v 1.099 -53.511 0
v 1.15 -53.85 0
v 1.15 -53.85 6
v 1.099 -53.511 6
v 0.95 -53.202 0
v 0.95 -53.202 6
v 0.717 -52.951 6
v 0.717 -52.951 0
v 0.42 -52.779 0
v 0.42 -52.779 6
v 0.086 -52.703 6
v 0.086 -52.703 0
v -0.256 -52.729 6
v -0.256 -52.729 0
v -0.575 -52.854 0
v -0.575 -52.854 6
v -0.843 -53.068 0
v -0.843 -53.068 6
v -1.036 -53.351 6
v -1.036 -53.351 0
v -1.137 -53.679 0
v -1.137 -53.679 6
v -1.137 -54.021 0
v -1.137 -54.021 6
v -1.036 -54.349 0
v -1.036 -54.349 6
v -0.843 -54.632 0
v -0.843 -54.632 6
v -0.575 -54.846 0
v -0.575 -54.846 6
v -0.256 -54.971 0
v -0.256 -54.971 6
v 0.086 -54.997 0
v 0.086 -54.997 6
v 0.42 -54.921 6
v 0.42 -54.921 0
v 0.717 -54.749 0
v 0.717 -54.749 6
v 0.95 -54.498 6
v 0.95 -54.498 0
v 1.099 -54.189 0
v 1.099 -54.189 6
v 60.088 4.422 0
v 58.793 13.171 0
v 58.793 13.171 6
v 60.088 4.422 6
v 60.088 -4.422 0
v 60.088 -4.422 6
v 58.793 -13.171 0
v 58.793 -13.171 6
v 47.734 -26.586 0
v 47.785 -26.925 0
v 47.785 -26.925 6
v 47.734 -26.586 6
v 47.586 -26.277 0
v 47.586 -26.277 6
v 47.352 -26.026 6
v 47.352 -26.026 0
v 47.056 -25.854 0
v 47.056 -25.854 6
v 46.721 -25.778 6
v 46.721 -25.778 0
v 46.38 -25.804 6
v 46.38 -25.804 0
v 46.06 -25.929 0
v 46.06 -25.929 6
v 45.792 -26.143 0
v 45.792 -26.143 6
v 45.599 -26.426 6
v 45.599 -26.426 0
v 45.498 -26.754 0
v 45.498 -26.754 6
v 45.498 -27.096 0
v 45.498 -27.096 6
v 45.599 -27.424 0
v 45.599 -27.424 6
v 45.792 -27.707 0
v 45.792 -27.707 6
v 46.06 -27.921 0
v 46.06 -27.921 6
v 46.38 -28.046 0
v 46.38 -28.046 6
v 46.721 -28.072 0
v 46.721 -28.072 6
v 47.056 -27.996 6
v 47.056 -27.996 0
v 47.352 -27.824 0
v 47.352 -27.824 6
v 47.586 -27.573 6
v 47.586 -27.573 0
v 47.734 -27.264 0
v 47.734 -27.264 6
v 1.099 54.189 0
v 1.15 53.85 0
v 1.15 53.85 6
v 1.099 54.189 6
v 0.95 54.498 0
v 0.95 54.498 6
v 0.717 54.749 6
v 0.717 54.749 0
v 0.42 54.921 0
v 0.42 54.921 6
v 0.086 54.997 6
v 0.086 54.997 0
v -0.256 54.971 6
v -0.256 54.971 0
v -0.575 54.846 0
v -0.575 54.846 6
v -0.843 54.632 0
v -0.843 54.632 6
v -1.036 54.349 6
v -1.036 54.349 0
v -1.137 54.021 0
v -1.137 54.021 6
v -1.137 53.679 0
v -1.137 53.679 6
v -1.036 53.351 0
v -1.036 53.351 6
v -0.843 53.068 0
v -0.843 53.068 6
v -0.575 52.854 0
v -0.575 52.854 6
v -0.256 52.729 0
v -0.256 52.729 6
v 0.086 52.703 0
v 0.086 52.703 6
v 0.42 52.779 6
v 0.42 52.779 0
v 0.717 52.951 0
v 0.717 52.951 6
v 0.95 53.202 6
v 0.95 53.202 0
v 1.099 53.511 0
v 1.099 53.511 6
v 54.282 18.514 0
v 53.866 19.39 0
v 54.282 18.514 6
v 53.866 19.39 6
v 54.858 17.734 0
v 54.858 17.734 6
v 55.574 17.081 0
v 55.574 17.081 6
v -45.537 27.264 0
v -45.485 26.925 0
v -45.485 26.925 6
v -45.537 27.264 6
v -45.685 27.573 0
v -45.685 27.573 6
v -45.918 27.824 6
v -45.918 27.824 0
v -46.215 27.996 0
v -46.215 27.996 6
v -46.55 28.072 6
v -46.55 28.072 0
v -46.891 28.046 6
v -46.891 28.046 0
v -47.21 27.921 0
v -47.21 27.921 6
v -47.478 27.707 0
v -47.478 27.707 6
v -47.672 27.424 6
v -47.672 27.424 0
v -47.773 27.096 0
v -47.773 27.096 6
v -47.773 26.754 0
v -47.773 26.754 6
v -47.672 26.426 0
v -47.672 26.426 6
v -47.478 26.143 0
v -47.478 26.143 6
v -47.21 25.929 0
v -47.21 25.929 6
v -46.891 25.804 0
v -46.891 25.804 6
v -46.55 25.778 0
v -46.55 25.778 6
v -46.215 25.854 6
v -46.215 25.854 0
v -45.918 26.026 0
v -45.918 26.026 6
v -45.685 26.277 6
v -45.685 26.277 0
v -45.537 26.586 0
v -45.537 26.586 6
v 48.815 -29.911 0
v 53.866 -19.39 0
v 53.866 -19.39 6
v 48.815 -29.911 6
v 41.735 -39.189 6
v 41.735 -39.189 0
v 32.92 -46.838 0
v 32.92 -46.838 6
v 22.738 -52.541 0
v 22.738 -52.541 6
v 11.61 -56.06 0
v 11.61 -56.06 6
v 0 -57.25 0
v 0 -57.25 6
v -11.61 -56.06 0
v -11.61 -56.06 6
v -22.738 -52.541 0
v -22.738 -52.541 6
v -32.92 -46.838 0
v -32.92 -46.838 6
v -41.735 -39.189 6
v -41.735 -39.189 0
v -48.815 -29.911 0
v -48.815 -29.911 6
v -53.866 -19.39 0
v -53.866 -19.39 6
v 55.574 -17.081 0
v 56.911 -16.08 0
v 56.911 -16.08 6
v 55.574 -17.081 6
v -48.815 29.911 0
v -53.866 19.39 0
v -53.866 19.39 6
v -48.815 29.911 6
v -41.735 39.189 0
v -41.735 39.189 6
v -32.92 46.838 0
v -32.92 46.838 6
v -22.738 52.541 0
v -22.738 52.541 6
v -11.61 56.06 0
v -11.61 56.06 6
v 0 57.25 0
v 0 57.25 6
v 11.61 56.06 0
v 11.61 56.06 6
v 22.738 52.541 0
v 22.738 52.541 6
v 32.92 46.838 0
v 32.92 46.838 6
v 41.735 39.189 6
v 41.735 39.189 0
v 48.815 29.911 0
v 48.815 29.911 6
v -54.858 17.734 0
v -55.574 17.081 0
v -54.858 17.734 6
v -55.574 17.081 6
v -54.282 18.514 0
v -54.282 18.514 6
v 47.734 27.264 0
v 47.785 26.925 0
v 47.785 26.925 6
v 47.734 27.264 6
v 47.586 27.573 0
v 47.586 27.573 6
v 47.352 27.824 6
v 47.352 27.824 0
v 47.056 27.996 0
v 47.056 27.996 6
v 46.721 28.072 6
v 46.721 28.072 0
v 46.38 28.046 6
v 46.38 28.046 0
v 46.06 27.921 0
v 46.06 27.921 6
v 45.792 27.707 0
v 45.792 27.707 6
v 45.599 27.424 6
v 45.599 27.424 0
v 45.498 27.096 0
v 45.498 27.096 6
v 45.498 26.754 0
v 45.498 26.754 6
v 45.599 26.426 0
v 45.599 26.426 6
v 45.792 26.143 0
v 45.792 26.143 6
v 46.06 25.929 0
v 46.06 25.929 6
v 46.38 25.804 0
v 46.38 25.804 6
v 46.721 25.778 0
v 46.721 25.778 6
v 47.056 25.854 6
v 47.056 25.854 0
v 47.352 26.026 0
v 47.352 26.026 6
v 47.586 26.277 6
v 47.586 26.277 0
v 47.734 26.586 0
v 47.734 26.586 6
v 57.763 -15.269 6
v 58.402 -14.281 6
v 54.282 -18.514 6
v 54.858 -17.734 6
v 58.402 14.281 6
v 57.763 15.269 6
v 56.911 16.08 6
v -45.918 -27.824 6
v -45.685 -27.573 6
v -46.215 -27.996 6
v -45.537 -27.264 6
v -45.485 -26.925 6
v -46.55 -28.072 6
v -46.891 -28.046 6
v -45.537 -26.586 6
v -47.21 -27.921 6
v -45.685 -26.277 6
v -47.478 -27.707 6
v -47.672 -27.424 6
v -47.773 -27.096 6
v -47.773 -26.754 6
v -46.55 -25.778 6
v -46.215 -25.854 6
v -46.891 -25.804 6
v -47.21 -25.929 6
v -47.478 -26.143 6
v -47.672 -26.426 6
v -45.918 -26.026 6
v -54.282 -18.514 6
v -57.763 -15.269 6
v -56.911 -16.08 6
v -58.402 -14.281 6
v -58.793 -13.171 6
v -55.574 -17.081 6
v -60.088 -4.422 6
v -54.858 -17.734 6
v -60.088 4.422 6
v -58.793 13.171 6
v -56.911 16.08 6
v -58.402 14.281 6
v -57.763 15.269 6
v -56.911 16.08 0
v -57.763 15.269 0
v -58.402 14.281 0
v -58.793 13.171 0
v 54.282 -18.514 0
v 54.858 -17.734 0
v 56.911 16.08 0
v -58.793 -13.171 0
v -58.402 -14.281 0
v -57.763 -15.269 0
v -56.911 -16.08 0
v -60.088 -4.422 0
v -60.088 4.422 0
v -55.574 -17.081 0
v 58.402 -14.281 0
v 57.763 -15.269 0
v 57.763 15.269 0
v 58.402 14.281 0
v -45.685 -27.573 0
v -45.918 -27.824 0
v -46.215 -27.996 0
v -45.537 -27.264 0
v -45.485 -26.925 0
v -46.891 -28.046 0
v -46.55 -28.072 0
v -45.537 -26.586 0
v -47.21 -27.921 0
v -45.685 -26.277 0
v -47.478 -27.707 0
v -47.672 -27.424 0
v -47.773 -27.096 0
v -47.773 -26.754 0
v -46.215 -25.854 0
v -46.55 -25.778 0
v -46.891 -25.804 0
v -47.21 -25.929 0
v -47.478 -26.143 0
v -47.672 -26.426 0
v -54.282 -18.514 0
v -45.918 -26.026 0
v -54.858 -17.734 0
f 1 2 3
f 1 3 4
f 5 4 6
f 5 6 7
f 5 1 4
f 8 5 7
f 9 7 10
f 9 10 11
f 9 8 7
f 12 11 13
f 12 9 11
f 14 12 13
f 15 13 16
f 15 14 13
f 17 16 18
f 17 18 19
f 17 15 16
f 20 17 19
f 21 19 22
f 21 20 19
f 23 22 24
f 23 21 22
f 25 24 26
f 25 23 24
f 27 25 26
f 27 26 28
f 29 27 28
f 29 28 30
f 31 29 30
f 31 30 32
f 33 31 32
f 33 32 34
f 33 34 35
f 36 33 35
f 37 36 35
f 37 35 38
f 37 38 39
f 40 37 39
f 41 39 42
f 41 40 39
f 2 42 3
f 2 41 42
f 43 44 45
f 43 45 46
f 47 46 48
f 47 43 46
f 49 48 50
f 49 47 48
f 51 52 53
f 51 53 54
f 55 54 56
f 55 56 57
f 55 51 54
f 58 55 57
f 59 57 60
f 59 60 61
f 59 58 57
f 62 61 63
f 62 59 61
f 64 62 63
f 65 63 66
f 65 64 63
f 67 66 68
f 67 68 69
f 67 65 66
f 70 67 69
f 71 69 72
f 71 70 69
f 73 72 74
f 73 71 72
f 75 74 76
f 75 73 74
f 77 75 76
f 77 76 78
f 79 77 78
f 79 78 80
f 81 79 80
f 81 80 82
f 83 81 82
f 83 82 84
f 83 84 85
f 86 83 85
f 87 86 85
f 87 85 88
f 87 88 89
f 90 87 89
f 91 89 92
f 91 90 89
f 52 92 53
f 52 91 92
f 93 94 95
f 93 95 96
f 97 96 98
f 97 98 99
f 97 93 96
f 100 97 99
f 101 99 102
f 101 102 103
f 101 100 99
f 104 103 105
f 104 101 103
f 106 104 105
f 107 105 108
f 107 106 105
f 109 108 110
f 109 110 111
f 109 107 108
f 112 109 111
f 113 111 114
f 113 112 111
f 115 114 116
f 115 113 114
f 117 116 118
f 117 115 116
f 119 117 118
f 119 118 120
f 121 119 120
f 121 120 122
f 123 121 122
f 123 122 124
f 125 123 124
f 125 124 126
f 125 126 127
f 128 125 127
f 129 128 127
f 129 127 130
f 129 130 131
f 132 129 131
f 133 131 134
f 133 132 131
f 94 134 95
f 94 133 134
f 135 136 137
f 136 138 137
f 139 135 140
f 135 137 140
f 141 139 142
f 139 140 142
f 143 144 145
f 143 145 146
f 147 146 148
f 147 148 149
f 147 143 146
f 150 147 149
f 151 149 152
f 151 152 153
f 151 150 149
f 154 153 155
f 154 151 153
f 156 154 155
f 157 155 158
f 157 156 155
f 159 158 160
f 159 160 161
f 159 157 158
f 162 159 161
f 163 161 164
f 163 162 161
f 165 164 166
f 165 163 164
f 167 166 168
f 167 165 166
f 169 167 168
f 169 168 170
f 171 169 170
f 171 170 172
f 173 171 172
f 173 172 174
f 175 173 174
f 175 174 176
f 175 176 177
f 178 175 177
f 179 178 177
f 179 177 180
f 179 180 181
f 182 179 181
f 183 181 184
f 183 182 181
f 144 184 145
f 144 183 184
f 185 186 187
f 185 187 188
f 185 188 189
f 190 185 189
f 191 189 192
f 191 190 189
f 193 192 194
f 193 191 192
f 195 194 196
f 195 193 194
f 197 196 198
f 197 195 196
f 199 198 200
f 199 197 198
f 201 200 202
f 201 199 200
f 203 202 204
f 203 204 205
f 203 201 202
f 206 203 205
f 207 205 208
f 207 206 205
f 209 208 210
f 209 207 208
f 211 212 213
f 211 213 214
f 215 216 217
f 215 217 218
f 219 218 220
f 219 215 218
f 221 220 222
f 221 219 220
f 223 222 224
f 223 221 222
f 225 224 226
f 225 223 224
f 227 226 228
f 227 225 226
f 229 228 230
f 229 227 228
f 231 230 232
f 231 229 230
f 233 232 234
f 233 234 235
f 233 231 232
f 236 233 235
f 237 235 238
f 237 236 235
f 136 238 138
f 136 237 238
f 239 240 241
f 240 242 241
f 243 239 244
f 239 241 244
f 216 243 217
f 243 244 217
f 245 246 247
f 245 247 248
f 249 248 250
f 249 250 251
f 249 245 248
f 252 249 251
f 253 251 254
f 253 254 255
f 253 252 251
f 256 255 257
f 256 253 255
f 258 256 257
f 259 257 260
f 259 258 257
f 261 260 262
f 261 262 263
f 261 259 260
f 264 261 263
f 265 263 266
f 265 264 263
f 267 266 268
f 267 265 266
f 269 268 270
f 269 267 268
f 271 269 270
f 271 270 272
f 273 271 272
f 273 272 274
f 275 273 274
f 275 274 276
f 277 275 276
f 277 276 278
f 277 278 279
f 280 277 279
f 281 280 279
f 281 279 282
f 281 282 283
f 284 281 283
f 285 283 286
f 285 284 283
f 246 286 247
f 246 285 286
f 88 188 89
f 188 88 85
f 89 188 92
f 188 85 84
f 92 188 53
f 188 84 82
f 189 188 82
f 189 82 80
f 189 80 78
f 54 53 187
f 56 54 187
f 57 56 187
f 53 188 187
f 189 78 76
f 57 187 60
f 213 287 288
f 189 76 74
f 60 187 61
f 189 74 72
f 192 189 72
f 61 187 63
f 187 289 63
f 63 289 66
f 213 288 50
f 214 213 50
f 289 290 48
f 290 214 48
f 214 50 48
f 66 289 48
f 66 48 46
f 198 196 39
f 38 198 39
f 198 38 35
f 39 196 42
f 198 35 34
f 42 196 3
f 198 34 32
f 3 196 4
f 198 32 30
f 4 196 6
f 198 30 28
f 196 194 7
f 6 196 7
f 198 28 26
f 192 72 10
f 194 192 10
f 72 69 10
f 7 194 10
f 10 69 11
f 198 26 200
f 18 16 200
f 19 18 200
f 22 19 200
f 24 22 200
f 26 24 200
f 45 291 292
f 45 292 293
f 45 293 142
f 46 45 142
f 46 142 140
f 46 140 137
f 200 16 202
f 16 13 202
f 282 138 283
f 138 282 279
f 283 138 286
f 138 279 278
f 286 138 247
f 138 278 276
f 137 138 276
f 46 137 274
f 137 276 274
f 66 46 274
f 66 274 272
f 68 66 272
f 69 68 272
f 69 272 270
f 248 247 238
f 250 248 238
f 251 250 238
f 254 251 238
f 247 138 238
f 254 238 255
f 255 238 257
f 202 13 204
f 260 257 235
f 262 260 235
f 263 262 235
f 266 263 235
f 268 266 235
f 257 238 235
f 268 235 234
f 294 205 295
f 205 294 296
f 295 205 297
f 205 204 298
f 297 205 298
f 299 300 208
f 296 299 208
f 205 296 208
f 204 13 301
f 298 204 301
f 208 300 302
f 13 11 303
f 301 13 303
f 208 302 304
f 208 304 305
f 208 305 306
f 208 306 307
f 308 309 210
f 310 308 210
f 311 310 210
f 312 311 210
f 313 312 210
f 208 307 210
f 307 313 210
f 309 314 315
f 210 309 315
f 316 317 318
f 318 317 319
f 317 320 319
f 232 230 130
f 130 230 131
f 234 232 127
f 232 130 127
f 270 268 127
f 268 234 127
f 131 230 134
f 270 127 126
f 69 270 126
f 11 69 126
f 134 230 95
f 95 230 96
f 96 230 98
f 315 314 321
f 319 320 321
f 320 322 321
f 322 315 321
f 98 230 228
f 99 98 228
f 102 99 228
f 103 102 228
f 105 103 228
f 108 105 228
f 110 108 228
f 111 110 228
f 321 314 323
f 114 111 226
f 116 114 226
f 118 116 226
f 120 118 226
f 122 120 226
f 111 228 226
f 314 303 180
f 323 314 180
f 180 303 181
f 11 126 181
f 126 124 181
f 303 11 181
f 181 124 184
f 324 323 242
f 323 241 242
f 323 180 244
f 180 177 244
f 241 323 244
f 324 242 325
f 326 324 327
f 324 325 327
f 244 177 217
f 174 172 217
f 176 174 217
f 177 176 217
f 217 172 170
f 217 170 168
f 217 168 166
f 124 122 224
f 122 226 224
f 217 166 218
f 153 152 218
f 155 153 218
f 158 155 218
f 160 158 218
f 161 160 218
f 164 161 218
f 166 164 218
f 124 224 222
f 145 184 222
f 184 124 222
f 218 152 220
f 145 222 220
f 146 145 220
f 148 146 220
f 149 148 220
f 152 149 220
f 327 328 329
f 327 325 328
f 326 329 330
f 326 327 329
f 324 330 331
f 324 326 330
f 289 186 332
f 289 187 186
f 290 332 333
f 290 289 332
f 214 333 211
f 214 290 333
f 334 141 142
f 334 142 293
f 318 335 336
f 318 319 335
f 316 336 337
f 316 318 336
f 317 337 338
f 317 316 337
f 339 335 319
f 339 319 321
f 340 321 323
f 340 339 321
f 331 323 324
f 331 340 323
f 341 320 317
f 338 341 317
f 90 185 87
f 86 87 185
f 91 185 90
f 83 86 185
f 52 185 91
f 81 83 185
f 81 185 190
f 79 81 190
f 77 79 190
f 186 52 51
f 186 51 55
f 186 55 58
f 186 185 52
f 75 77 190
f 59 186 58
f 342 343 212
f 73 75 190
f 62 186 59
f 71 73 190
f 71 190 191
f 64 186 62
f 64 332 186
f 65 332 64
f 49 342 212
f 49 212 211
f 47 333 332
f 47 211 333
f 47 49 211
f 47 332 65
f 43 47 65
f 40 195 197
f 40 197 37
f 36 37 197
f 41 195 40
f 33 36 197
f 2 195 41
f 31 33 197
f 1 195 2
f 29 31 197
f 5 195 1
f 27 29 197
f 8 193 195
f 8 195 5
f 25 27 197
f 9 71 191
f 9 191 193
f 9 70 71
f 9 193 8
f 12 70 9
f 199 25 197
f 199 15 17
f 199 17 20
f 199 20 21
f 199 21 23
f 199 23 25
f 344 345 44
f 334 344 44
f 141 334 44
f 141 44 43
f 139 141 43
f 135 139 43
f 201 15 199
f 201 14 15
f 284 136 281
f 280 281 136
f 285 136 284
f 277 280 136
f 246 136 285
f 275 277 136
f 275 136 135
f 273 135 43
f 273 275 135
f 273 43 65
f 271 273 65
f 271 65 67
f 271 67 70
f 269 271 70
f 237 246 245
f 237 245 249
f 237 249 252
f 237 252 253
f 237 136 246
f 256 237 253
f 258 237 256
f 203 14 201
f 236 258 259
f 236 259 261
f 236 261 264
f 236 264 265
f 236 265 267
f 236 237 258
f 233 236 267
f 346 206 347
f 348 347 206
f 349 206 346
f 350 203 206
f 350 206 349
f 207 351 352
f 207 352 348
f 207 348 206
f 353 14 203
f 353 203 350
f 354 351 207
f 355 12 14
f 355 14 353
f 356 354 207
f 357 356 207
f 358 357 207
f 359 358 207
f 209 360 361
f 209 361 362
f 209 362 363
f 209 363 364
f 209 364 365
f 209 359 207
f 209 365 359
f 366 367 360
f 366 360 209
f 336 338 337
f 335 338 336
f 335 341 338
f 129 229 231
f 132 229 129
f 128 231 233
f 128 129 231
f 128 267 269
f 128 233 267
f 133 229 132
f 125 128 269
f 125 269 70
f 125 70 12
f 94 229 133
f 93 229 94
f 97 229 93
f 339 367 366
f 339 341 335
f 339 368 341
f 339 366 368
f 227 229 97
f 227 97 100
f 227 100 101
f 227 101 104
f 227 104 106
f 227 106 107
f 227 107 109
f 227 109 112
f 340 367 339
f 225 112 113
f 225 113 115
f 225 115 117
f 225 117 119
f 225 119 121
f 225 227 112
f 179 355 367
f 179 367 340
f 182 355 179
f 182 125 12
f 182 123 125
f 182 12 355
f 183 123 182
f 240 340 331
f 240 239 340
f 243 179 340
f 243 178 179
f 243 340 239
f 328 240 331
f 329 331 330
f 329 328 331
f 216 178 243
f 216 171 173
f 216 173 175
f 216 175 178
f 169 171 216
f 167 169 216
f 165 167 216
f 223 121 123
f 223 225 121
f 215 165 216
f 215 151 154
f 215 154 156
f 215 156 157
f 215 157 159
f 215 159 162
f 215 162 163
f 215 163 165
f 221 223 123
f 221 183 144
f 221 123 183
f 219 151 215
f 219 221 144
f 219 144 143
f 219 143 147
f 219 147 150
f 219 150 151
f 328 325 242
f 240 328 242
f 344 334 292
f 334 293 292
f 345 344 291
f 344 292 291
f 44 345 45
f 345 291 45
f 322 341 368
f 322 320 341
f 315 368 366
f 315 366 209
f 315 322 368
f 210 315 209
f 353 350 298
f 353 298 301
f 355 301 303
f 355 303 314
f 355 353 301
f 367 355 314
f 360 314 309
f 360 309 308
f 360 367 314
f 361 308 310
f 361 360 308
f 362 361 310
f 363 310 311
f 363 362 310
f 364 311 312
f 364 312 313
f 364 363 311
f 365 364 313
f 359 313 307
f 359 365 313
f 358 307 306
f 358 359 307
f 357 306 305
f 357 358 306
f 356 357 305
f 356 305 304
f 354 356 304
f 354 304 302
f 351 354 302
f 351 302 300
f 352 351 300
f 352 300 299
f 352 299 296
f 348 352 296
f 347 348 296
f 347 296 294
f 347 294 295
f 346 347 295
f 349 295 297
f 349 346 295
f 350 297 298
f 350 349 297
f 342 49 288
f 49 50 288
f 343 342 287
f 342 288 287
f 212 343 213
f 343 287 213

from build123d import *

# Parameters (mm, degrees)
ESQUISSE1_R        = 1.15
BOSS_EXTRU_1_DEPTH = 6
CONG_1_R           = 5


with BuildPart() as part:
    # Esquisse1 → Boss.-Extru.1 (new body)
    with BuildSketch(Plane.XY):
        with BuildLine():
            Line((-58.352913381, 15), (-54.346688032, 18))
            ThreePointArc((-54.346688032, 18), (0, 57.25), (54.346688032, 18))
            Line((54.346688032, 18), (58.352913381, 15))
            ThreePointArc((58.352913381, 15), (60.25, 0), (58.352913381, -15))
            Line((58.352913381, -15), (54.346688032, -18))
            ThreePointArc((54.346688032, -18), (0, -57.25), (-54.346688032, -18))
            Line((-54.346688032, -18), (-58.352913381, -15))
            ThreePointArc((-58.352913381, -15), (-60.25, 0), (-58.352913381, 15))
        make_face()
        with Locations((0, 53.85)):
            Circle(ESQUISSE1_R, mode=Mode.SUBTRACT)
        with Locations((46.635467994, 26.925)):
            Circle(ESQUISSE1_R, mode=Mode.SUBTRACT)
        with Locations((46.635467994, -26.925)):
            Circle(ESQUISSE1_R, mode=Mode.SUBTRACT)
        with Locations((0, -53.85)):
            Circle(ESQUISSE1_R, mode=Mode.SUBTRACT)
        with Locations((-46.635467994, -26.925)):
            Circle(ESQUISSE1_R, mode=Mode.SUBTRACT)
        with Locations((-46.635467994, 26.925)):
            Circle(ESQUISSE1_R, mode=Mode.SUBTRACT)
    extrude(amount=BOSS_EXTRU_1_DEPTH)

    # Congé1
    cong_1_edges = [part.edges().sort_by_distance(p)[0] for p in [
        (-54.346688032, -18, 3),
        (-58.352913381, -15, 3),
        (-58.352913381, 15, 3),
        (-54.346688032, 18, 3),
        (54.346688032, 18, 3),
        (58.352913381, 15, 3),
        (58.352913381, -15, 3),
        (54.346688032, -18, 3),
    ]]
    fillet(cong_1_edges, radius=CONG_1_R)


solid = part.part
